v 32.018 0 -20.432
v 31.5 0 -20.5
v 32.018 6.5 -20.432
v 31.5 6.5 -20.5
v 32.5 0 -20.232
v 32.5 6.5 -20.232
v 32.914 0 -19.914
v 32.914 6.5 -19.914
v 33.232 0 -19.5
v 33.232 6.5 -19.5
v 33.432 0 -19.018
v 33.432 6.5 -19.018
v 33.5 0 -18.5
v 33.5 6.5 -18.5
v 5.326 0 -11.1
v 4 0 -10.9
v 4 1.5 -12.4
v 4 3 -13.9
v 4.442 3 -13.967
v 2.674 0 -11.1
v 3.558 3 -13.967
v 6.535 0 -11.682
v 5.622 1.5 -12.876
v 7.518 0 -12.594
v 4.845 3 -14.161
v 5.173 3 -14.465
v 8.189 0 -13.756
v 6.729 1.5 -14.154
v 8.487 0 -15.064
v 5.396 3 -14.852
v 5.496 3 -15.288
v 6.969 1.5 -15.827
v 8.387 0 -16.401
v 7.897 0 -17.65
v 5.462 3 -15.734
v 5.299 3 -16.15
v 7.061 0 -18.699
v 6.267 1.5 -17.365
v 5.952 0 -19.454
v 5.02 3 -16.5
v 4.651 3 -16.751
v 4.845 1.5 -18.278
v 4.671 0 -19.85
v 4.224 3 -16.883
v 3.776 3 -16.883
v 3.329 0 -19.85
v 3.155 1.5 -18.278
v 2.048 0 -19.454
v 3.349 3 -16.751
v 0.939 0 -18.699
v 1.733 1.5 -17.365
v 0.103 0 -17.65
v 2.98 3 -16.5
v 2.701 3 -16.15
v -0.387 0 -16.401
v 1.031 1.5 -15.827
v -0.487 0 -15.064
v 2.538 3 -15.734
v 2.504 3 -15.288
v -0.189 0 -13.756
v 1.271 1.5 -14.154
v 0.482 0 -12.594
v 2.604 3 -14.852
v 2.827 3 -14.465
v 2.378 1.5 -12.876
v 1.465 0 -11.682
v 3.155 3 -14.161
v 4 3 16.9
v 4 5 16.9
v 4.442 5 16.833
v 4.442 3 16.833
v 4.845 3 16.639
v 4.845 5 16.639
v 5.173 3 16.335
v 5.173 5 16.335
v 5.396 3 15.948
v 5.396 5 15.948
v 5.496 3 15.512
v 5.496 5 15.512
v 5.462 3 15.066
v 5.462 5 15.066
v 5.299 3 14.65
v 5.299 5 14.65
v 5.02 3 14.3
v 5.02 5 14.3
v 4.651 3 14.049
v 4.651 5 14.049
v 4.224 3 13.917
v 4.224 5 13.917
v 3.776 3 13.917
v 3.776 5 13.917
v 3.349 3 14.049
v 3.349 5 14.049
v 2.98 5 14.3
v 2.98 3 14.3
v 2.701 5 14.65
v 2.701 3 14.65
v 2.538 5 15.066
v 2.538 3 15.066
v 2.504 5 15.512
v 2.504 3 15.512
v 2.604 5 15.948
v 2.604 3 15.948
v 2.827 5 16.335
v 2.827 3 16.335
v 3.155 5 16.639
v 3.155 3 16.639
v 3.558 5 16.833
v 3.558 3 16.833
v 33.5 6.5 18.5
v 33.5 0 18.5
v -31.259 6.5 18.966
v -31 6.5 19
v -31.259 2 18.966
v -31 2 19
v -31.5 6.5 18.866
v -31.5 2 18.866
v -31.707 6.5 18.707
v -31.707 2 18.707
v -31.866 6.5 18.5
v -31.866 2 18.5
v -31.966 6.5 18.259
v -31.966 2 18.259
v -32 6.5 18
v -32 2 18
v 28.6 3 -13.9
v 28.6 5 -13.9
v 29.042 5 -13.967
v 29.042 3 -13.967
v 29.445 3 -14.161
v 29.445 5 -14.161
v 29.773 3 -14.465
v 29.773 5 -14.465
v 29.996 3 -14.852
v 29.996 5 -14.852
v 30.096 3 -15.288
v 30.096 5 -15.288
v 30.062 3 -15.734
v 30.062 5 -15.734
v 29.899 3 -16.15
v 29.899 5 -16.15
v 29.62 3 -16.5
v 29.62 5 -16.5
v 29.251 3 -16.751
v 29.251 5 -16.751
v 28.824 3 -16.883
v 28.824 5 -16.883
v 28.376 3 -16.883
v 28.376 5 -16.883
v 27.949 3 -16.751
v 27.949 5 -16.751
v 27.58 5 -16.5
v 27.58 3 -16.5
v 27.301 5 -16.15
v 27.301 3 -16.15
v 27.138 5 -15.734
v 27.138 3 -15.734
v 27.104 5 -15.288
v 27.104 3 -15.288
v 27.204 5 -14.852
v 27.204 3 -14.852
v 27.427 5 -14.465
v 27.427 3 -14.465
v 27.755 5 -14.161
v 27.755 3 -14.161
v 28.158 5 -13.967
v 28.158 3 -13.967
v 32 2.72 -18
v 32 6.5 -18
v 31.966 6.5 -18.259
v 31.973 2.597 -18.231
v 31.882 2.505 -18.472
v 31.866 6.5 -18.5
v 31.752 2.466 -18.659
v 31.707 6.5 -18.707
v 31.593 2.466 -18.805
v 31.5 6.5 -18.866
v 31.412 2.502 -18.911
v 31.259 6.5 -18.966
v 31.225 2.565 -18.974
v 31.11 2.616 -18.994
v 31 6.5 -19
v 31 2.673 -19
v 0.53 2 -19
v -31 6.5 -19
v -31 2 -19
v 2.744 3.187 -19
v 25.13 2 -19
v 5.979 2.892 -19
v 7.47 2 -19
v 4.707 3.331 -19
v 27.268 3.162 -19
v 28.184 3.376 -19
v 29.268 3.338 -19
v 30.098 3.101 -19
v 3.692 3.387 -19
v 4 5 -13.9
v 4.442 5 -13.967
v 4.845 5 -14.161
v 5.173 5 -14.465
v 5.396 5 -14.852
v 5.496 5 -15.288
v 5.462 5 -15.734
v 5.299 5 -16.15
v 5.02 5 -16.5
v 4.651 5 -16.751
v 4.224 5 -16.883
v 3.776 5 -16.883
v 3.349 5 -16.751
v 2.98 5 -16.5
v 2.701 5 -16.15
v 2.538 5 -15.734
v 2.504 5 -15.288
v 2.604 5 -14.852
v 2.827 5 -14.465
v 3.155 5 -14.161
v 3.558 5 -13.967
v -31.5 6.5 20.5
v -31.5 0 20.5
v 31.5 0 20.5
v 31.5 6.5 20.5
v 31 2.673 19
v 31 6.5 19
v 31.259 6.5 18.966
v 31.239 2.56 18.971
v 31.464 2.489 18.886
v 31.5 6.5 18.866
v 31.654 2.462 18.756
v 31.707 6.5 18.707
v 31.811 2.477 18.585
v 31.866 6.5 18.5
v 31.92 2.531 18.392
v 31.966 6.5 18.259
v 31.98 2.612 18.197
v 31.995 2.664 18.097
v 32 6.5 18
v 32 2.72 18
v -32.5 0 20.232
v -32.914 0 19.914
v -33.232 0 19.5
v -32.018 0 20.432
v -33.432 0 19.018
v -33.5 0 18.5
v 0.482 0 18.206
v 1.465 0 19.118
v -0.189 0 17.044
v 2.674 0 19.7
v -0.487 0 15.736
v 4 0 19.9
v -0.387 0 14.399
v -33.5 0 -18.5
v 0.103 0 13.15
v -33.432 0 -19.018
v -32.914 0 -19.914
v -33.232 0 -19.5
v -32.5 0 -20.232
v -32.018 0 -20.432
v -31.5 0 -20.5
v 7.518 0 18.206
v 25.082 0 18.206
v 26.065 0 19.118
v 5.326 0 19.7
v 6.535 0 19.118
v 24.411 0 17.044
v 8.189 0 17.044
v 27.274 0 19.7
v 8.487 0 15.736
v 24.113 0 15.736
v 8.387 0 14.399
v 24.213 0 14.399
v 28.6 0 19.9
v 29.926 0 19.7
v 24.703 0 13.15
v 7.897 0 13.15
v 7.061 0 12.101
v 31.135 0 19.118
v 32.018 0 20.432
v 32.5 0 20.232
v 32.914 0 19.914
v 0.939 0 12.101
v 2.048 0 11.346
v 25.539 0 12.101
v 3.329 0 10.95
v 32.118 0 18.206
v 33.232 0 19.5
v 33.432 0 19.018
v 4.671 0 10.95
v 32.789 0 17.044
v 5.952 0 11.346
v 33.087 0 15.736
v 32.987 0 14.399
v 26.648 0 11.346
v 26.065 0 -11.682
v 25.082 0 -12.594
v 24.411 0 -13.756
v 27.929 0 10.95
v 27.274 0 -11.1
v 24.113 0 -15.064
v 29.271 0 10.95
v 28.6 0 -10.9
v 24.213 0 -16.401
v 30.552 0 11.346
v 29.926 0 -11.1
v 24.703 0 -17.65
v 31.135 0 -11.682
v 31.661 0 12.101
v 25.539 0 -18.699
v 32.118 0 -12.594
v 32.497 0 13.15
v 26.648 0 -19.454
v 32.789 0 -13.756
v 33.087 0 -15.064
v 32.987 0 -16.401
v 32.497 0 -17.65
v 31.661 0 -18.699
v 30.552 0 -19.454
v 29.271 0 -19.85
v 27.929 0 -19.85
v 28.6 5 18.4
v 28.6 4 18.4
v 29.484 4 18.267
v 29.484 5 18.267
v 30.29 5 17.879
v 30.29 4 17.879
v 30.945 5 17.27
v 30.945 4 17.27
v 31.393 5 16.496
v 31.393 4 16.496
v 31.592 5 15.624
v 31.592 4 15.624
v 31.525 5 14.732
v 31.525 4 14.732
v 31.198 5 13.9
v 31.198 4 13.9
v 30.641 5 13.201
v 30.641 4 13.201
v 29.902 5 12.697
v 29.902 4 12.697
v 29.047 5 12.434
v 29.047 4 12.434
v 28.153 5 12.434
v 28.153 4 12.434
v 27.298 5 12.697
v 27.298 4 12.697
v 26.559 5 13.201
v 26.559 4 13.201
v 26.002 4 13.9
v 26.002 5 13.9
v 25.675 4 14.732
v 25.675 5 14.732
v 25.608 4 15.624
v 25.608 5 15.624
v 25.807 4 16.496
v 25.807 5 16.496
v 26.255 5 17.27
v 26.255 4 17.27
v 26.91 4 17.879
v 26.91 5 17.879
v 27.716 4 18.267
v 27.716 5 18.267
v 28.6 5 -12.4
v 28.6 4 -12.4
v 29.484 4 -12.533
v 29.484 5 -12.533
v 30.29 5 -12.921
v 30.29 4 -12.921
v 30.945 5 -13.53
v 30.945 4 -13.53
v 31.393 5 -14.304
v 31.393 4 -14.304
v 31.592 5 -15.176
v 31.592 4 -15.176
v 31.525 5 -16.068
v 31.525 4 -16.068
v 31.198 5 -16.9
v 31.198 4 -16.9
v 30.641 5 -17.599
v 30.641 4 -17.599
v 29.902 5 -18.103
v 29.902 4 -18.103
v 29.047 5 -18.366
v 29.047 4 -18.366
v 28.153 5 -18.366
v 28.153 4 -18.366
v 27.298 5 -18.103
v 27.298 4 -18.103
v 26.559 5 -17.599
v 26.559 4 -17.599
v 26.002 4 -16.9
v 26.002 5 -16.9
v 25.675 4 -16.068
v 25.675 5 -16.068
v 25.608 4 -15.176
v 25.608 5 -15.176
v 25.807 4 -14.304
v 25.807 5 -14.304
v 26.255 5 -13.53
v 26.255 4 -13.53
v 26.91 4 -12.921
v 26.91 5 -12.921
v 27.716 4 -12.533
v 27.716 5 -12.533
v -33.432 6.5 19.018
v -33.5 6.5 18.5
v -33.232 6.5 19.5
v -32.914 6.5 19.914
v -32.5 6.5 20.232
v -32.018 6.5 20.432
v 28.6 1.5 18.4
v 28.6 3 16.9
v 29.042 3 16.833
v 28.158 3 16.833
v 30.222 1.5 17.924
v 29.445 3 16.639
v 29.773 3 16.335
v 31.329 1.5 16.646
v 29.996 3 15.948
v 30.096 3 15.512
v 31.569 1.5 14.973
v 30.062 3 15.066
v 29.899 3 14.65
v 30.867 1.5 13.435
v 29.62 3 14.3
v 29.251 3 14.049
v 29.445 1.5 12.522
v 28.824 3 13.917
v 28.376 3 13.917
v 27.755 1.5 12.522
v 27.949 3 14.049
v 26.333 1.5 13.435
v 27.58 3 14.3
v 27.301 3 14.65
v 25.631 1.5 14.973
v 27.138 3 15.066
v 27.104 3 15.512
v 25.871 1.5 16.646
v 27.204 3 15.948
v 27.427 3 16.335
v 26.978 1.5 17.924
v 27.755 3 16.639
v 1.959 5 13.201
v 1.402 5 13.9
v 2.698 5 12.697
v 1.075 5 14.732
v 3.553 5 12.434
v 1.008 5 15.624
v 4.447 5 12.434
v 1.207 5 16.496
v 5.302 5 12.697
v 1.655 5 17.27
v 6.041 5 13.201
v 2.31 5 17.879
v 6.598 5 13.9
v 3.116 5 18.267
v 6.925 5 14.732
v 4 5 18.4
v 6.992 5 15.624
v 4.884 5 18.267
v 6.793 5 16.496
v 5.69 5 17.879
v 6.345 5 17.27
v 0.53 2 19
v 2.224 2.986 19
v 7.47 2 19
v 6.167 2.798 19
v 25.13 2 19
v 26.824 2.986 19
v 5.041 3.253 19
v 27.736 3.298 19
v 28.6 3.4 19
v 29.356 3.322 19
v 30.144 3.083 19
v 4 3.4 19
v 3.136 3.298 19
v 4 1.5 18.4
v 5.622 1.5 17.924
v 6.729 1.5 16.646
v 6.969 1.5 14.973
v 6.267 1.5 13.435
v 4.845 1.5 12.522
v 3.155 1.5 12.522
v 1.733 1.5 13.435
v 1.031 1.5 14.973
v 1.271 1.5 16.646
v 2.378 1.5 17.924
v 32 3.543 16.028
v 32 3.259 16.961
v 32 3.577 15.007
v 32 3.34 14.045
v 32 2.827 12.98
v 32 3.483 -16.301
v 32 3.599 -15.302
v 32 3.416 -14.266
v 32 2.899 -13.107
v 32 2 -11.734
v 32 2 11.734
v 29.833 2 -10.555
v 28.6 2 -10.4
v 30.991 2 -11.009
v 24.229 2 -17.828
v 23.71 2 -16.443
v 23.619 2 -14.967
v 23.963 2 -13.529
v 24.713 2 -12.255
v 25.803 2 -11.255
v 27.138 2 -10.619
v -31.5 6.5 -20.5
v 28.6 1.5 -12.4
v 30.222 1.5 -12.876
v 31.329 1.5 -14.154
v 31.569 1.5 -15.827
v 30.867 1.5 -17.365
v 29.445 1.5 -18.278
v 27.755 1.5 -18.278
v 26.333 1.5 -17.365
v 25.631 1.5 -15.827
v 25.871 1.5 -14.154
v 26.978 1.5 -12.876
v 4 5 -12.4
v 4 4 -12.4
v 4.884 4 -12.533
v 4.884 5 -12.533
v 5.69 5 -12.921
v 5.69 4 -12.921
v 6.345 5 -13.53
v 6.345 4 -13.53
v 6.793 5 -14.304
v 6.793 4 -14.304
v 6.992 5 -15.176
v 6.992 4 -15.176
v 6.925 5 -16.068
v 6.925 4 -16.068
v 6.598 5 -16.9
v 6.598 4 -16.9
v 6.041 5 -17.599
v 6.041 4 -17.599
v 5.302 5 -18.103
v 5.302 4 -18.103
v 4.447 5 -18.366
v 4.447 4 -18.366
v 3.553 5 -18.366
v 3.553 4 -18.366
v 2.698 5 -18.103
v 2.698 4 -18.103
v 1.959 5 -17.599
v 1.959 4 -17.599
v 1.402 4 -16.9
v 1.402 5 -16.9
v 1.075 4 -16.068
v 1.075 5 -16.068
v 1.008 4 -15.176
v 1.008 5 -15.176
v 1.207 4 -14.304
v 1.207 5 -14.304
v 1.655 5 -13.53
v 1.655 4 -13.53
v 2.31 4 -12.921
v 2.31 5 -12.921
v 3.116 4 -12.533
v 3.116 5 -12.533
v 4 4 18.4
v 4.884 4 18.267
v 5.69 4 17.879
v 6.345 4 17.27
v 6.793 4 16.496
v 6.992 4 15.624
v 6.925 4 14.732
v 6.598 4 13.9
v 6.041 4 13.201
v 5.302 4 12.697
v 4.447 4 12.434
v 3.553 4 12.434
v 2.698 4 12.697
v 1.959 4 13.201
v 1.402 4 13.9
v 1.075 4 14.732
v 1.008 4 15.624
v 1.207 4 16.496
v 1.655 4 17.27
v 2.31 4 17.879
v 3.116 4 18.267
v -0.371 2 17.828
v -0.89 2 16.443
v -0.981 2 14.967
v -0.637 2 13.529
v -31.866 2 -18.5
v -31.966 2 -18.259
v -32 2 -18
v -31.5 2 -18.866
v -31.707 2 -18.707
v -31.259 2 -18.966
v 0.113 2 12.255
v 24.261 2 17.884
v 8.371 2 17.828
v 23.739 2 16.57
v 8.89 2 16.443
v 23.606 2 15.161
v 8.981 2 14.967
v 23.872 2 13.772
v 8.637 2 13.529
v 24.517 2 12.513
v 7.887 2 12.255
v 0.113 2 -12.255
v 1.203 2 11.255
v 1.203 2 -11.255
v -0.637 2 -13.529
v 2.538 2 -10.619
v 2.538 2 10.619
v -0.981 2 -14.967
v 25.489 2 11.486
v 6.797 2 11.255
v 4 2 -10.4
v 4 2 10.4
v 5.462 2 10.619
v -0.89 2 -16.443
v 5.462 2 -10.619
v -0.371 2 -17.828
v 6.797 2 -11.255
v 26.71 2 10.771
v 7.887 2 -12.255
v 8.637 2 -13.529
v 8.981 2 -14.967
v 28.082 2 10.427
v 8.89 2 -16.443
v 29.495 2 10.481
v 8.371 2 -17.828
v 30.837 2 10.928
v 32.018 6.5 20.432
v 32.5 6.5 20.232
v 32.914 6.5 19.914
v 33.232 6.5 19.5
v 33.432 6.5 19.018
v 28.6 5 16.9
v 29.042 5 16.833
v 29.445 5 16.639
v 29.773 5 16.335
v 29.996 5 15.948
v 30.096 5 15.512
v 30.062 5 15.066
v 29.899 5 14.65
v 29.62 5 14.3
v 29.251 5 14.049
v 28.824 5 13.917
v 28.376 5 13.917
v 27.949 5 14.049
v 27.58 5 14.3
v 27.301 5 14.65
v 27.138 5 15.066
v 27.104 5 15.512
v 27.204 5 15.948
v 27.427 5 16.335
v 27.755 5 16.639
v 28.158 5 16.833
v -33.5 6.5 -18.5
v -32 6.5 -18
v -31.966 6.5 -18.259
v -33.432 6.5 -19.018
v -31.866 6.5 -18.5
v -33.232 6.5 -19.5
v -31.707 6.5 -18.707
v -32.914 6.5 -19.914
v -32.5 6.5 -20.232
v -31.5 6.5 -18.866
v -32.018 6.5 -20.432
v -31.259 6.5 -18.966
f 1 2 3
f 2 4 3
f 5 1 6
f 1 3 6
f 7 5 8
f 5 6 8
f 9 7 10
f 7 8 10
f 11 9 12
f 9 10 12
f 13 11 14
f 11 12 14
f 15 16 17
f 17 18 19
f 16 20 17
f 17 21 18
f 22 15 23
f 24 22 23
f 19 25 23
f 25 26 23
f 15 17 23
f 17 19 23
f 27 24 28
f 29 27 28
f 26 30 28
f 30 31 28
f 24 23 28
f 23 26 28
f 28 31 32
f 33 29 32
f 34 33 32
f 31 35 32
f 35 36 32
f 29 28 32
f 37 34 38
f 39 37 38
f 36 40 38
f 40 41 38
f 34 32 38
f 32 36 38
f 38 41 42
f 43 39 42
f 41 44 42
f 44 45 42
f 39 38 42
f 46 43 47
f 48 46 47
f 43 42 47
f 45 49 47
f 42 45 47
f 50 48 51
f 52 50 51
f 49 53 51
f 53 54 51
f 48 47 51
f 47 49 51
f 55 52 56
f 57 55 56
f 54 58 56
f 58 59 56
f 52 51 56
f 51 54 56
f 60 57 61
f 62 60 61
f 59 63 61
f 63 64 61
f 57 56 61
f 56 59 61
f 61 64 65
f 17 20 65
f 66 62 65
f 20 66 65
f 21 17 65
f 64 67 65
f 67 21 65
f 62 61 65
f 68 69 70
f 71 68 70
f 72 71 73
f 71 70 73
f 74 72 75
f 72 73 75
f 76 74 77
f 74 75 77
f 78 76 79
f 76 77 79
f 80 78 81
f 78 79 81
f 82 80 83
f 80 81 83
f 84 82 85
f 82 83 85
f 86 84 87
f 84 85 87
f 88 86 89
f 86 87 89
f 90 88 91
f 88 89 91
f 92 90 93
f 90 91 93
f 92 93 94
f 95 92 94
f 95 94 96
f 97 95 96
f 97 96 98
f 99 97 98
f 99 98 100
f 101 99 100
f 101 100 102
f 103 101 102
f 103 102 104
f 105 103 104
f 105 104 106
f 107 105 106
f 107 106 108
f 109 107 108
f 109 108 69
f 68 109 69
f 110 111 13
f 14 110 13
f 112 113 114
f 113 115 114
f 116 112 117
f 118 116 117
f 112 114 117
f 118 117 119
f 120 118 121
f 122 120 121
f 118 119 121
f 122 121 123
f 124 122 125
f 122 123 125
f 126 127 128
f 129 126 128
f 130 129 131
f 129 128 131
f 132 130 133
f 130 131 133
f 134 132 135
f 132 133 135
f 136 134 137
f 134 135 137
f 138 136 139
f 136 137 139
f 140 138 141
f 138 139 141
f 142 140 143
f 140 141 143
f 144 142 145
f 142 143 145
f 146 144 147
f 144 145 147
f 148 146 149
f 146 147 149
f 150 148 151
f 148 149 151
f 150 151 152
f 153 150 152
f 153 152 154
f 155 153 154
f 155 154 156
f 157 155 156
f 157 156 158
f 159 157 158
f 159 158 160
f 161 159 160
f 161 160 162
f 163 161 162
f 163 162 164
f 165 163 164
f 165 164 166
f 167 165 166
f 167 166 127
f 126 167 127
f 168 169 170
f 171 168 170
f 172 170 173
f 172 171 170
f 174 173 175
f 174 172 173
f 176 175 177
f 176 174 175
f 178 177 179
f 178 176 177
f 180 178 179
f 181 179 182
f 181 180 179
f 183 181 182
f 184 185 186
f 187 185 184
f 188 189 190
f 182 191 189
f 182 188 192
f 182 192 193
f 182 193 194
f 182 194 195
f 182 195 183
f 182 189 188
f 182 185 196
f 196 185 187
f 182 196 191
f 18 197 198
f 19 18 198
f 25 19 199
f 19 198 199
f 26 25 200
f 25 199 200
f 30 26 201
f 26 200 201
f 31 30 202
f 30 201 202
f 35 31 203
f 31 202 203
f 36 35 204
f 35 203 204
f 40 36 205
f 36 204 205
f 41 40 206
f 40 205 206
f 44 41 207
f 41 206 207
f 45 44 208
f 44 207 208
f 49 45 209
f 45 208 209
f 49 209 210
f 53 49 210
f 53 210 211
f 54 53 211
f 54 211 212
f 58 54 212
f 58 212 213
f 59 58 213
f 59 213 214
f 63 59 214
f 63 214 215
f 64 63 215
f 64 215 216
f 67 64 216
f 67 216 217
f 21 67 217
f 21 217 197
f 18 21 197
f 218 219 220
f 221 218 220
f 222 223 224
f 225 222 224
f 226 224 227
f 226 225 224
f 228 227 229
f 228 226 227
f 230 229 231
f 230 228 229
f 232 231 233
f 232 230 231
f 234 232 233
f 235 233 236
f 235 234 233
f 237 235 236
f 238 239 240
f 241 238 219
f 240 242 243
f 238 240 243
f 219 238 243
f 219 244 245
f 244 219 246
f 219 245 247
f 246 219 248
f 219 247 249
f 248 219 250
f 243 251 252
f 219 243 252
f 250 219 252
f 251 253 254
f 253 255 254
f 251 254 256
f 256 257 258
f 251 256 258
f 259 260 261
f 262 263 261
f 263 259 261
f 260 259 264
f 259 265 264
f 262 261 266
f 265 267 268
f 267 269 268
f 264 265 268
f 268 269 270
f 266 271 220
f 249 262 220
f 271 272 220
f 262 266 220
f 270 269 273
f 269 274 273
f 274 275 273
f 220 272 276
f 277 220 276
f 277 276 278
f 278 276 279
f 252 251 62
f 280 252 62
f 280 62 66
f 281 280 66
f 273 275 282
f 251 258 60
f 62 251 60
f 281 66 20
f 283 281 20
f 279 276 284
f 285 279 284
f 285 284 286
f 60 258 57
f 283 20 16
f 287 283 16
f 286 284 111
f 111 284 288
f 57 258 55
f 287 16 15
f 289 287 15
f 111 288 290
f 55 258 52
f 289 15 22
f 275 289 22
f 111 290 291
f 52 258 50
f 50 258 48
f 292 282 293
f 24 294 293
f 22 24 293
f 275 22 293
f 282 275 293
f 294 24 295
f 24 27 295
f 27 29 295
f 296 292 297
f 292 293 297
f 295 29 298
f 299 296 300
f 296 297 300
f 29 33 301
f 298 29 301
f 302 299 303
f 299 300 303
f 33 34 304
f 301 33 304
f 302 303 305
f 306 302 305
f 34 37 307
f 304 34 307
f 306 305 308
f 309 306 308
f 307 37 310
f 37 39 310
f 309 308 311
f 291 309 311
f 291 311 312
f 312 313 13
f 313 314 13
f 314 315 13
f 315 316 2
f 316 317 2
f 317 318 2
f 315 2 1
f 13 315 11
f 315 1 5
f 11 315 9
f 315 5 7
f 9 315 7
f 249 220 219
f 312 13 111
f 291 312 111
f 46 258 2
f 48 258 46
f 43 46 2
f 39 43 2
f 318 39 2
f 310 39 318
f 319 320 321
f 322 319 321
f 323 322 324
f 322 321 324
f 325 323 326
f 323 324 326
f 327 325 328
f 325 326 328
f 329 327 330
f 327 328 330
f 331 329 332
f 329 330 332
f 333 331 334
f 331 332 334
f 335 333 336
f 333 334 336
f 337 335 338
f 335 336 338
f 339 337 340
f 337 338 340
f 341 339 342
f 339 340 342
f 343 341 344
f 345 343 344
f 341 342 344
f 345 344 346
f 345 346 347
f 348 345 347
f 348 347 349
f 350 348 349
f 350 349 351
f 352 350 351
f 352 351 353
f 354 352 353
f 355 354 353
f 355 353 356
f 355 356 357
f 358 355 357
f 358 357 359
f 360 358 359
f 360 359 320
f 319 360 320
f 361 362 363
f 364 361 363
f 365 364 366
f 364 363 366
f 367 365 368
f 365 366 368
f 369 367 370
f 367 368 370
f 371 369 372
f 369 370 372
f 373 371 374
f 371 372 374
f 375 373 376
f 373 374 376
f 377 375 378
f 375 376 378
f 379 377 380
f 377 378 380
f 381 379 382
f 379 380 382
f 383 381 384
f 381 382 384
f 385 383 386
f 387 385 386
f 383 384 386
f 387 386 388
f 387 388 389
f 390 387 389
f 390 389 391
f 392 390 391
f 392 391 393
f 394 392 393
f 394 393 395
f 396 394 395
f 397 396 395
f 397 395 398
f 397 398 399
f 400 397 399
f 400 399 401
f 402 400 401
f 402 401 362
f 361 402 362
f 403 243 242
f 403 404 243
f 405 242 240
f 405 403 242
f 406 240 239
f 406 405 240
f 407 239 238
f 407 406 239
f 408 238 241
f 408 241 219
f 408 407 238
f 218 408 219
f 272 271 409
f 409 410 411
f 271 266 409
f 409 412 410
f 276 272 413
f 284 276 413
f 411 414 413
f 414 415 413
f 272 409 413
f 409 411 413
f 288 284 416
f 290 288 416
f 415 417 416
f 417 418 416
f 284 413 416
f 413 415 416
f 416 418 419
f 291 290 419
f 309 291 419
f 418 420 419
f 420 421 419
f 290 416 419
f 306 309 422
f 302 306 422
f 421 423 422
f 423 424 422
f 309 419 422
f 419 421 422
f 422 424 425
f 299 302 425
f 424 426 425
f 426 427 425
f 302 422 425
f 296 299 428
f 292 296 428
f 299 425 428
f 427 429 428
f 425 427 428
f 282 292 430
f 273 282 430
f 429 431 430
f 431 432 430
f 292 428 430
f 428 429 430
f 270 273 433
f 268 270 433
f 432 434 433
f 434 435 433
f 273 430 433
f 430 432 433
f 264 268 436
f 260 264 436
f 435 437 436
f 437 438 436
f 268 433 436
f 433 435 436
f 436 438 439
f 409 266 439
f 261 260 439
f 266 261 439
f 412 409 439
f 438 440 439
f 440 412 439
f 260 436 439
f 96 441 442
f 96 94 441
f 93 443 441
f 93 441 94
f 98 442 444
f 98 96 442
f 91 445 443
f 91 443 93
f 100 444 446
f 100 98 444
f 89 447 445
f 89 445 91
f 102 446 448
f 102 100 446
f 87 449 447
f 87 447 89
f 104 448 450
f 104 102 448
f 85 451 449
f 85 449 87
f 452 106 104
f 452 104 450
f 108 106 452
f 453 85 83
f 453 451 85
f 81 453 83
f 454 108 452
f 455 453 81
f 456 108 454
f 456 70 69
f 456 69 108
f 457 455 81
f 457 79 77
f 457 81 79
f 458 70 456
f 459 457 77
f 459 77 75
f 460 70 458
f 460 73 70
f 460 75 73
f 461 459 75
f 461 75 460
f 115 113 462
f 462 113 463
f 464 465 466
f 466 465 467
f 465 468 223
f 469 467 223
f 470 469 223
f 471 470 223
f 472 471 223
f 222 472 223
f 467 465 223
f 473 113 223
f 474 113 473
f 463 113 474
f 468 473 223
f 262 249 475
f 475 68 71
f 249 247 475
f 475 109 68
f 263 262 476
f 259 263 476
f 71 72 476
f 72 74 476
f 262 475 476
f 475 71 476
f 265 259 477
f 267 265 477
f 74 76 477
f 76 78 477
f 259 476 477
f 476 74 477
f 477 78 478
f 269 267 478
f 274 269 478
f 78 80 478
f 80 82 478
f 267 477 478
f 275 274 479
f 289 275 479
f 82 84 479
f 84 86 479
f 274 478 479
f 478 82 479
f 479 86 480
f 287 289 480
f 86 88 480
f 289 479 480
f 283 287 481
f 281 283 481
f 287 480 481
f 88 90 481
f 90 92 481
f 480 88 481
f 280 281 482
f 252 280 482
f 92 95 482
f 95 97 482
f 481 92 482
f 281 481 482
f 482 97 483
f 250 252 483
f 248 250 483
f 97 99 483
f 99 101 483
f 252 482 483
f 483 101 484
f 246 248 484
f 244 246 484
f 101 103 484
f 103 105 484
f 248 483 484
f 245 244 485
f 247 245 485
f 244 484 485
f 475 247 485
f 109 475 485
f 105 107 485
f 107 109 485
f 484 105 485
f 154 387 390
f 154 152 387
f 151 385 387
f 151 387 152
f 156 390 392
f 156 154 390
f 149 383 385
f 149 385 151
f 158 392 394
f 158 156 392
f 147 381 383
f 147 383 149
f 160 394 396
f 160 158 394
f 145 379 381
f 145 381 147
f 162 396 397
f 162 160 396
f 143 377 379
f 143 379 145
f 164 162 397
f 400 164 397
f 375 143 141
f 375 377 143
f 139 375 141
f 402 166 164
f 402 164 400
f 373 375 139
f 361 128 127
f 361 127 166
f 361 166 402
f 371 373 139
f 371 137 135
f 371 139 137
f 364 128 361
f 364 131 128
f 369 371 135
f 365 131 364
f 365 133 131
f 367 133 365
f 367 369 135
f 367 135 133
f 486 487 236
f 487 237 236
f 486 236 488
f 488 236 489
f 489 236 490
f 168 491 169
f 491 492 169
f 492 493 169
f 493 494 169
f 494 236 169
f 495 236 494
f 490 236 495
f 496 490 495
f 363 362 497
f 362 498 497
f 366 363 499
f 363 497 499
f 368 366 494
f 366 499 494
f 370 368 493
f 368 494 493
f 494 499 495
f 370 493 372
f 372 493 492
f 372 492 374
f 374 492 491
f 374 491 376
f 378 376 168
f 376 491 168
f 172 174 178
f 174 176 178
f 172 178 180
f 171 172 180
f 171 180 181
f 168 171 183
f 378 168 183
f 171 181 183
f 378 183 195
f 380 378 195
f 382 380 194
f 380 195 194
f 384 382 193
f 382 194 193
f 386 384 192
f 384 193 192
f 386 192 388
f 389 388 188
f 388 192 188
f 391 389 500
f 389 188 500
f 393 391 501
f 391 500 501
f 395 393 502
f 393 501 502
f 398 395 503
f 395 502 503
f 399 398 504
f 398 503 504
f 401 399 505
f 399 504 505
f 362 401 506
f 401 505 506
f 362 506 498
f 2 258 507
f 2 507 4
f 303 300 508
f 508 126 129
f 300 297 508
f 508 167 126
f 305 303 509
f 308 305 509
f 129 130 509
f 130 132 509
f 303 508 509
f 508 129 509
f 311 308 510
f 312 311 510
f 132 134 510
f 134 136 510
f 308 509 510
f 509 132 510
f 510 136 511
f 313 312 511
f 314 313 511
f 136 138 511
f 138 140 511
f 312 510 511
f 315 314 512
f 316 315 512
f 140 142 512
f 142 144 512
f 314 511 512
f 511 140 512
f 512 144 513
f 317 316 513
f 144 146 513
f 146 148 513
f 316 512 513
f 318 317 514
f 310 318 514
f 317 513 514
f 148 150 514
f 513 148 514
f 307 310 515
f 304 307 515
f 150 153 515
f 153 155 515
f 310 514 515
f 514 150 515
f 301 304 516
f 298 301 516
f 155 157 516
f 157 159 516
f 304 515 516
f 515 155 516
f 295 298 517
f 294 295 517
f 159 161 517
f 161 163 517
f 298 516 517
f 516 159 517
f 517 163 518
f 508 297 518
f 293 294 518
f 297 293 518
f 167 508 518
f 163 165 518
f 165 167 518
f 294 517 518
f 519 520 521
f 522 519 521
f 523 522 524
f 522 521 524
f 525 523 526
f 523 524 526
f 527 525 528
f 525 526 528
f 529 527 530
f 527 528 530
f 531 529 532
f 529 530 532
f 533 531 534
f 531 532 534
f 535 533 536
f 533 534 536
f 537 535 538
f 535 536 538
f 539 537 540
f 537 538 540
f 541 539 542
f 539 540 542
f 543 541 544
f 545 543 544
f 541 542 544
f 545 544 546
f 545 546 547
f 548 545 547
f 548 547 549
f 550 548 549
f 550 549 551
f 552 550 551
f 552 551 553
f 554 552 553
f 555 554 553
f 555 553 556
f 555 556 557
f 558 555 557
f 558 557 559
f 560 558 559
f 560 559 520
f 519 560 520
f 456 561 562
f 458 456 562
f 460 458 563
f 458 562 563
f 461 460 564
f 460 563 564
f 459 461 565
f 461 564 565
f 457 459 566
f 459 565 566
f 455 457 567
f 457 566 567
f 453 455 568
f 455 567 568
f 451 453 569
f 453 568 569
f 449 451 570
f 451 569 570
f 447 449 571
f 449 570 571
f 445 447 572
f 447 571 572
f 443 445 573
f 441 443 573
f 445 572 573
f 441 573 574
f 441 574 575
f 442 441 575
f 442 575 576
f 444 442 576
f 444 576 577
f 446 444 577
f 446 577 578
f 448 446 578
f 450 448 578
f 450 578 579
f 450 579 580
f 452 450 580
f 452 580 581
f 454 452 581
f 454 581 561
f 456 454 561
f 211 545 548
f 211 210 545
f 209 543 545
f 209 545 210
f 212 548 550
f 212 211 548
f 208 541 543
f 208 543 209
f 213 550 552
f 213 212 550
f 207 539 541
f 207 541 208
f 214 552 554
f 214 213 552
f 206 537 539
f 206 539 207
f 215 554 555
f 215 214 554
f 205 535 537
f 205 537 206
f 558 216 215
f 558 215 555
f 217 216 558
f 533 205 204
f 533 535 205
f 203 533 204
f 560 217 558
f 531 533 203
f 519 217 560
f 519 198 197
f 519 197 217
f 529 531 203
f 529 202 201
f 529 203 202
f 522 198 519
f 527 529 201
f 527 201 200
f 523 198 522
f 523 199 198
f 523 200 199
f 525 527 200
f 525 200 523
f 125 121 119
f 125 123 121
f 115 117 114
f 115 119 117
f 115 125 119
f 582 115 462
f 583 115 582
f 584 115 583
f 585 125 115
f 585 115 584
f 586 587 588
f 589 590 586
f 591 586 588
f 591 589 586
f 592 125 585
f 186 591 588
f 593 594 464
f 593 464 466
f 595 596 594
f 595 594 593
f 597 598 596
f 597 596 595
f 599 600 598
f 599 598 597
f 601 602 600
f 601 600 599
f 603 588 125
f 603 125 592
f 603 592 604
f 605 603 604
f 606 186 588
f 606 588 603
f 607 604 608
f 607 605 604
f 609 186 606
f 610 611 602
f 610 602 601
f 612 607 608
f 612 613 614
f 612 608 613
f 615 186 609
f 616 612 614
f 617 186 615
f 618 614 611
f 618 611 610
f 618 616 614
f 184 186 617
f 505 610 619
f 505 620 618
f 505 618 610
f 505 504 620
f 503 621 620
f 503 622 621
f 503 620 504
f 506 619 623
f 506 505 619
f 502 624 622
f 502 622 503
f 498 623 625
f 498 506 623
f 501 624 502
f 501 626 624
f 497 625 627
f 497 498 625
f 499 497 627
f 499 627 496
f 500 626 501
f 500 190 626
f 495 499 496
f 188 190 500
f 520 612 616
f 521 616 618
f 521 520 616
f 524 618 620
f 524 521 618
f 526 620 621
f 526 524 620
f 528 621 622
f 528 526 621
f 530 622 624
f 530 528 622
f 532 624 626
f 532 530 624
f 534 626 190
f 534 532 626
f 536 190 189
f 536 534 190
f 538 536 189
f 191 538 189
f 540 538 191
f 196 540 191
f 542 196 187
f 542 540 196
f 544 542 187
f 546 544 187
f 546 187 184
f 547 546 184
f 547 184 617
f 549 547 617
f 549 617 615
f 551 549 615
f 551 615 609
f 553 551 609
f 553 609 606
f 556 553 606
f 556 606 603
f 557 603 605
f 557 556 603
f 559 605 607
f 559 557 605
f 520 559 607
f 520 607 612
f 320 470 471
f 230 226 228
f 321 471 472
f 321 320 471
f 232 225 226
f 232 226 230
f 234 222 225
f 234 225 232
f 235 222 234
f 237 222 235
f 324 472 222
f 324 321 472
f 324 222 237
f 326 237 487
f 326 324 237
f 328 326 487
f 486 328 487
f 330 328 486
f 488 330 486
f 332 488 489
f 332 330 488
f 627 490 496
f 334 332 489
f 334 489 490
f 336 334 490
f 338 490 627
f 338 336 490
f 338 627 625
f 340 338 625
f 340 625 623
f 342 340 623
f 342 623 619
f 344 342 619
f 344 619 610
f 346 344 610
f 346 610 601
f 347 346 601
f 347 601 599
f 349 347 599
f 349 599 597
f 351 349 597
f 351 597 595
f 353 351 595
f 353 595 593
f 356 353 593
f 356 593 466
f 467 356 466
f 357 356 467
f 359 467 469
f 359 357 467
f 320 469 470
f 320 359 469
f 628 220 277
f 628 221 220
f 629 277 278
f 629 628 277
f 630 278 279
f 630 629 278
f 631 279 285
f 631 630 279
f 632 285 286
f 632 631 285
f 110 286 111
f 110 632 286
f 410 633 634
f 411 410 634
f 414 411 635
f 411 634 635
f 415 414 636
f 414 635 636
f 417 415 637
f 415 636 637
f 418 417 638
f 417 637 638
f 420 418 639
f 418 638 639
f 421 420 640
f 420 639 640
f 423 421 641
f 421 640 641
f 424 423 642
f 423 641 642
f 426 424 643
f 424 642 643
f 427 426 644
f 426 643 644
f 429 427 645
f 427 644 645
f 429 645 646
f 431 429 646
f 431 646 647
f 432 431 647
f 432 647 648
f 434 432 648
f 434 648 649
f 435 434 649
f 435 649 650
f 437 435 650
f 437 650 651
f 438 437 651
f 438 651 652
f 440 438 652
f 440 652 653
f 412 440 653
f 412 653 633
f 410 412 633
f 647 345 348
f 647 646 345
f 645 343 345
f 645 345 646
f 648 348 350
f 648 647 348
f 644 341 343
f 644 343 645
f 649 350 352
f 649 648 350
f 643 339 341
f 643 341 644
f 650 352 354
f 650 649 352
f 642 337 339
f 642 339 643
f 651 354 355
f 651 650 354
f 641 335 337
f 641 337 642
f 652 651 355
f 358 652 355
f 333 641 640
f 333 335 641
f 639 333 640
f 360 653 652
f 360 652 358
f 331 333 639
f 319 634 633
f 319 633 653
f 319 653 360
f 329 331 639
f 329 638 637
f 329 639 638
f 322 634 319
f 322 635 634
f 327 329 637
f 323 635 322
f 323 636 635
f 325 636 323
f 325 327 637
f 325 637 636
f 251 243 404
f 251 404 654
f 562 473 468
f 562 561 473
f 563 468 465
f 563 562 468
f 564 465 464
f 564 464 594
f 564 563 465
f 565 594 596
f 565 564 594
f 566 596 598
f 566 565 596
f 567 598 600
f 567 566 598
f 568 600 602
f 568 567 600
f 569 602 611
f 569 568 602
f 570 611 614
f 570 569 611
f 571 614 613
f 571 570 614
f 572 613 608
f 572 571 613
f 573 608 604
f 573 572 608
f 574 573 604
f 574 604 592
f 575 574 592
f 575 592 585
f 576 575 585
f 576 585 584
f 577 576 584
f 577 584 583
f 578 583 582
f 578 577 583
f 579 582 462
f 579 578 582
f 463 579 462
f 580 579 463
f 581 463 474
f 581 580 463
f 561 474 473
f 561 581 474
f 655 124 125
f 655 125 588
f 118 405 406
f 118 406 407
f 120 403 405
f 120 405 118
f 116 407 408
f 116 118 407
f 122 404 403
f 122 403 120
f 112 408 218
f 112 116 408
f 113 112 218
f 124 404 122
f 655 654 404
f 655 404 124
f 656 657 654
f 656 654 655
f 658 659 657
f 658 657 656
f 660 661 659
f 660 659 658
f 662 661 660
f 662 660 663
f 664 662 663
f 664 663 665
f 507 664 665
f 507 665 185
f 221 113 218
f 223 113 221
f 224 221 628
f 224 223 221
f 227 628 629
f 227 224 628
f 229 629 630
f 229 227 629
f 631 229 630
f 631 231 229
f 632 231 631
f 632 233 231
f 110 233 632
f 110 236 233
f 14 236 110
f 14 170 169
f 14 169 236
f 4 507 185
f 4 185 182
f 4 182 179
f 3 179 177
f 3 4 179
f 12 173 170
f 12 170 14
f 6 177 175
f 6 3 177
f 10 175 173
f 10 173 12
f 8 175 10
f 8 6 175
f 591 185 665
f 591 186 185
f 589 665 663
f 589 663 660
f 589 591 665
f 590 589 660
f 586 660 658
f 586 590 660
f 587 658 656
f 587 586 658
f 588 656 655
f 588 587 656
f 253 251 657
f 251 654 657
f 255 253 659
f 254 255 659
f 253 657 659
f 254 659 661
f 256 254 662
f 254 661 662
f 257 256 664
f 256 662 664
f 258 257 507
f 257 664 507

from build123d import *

# Parameters (mm, degrees)
SKETCH_1_W          = 67
SKETCH_1_H          = 41
EXTRUDE_1_DEPTH     = 6.5
SKETCH_2_W          = 64
SKETCH_2_H          = 38
CUT_EXTRUDE_1_DEPTH = 4.5
FILLET_1_R          = 1
FILLET_2_R          = 2
SKETCH_3_R          = 3
EXTRUDE_2_DEPTH     = 3
SKETCH_4_R          = 1.5
CUT_EXTRUDE_2_DEPTH = 6
CHAMFER_1_SIZE      = 3
CHAMFER_2_SIZE      = 2


with BuildPart() as part:
    # Эскиз1 → Бобышка-Вытянуть1 (new body)
    with BuildSketch(Plane(origin=(0, 0, 0), x_dir=(1, 0, 0), z_dir=(0, 1, 0))):
        Rectangle(SKETCH_1_W, SKETCH_1_H)
    extrude(amount=EXTRUDE_1_DEPTH)

    # Эскиз2 → Вырез-Вытянуть1 (cut)
    with BuildSketch(Plane(origin=(0, 6.5, 0), x_dir=(1, 0, 0), z_dir=(0, 1, 0))):
        Rectangle(SKETCH_2_W, SKETCH_2_H)
    extrude(amount=-CUT_EXTRUDE_1_DEPTH, mode=Mode.SUBTRACT)

    # Скругление1
    fillet_1_edges = [part.edges().sort_by_distance(p)[0] for p in [
        (32, 4.25, -19),
        (32, 4.25, 19),
        (-32, 4.25, 19),
        (-32, 4.25, -19),
    ]]
    fillet(fillet_1_edges, radius=FILLET_1_R)

    # Скругление2
    fillet_2_edges = [part.edges().sort_by_distance(p)[0] for p in [
        (33.5, 3.25, 20.5),
        (-33.5, 3.25, 20.5),
        (-33.5, 3.25, -20.5),
        (33.5, 3.25, -20.5),
    ]]
    fillet(fillet_2_edges, radius=FILLET_2_R)

    # Эскиз3 → Бобышка-Вытянуть2 (add)
    with BuildSketch(Plane(origin=(0, 2, 0), x_dir=(1, 0, 0), z_dir=(0, 1, 0))):
        with Locations(Location((28.6, 15.4, 0), (0, 0, 270))):
            Circle(SKETCH_3_R)
        with Locations(Location((4, 15.4, 0), (0, 0, 270))):
            Circle(SKETCH_3_R)
        with Locations(Location((4, -15.4, 0), (0, 0, 270))):
            Circle(SKETCH_3_R)
        with Locations(Location((28.6, -15.4, 0), (0, 0, 270))):
            Circle(SKETCH_3_R)
    extrude(amount=EXTRUDE_2_DEPTH)

    # Эскиз4 → Вырез-Вытянуть2 (cut)
    with BuildSketch(Plane(origin=(0, 5, 0), x_dir=(1, 0, 0), z_dir=(0, 1, 0))):
        with Locations(Location((4, 15.4, 0), (0, 0, 270))):
            Circle(SKETCH_4_R)
        with Locations(Location((28.6, 15.4, 0), (0, 0, 270))):
            Circle(SKETCH_4_R)
        with Locations(Location((28.6, -15.4, 0), (0, 0, 270))):
            Circle(SKETCH_4_R)
        with Locations(Location((4, -15.4, 0), (0, 0, 270))):
            Circle(SKETCH_4_R)
    extrude(amount=-CUT_EXTRUDE_2_DEPTH, mode=Mode.SUBTRACT)

    # Фаска1
    chamfer_1_edges = [part.edges().sort_by_distance(p)[0] for p in [
        (28.6, 0, -16.9),
        (4, 0, -16.9),
        (4, 0, 13.9),
        (28.6, 0, 13.9),
    ]]
    chamfer(chamfer_1_edges, length=CHAMFER_1_SIZE)

    # Фаска2
    # the kernel refuses this chamfer: 2 mm, written as the material it adds along each edge
    with BuildSketch(Plane(origin=(28.6, 2, -15.4), x_dir=(0, 0, 1), z_dir=(-1, 0, 0))) as chamfer_2_piece_1_section:
        Polygon((3, CHAMFER_2_SIZE), (3 + CHAMFER_2_SIZE, 0), (3, 0), align=None)
    chamfer_2_piece_1 = revolve(axis=Axis((28.6, 2, -15.4), (0, 1, 0)), mode=Mode.PRIVATE)
    chamfer_2_piece_1 = split(chamfer_2_piece_1, bisect_by=Plane(origin=(32, 3.643767664, -12.314318949), z_dir=(-1, 0, 0)), keep=Keep.TOP, mode=Mode.PRIVATE)
    add(chamfer_2_piece_1)
    with BuildSketch(Plane(origin=(4, 2, -15.4), x_dir=(0, 0, 1), z_dir=(-1, 0, 0))) as chamfer_2_piece_2:
        Polygon((3 + CHAMFER_2_SIZE, 0), (3, CHAMFER_2_SIZE), (3, 0), align=None)
    revolve(axis=Axis((4, 2, -15.4), (0, 1, 0)))
    with BuildSketch(Plane(origin=(28.6, 2, 15.4), x_dir=(0, 0, 1), z_dir=(-1, 0, 0))) as chamfer_2_piece_3_section:
        Polygon((3 + CHAMFER_2_SIZE, 0), (3, CHAMFER_2_SIZE), (3, 0), align=None)
    chamfer_2_piece_3 = revolve(axis=Axis((28.6, 2, 15.4), (0, 1, 0)), mode=Mode.PRIVATE)
    chamfer_2_piece_3 = split(chamfer_2_piece_3, bisect_by=Plane(origin=(32, 3.313770234, 18.884228213), z_dir=(-1, 0, 0)), keep=Keep.TOP, mode=Mode.PRIVATE)
    add(chamfer_2_piece_3)
    with BuildSketch(Plane(origin=(4, 2, 15.4), x_dir=(0, 0, 1), z_dir=(-1, 0, 0))) as chamfer_2_piece_4:
        Polygon((3 + CHAMFER_2_SIZE, 0), (3, CHAMFER_2_SIZE), (3, 0), align=None)
    revolve(axis=Axis((4, 2, 15.4), (0, 1, 0)))


solid = part.part
